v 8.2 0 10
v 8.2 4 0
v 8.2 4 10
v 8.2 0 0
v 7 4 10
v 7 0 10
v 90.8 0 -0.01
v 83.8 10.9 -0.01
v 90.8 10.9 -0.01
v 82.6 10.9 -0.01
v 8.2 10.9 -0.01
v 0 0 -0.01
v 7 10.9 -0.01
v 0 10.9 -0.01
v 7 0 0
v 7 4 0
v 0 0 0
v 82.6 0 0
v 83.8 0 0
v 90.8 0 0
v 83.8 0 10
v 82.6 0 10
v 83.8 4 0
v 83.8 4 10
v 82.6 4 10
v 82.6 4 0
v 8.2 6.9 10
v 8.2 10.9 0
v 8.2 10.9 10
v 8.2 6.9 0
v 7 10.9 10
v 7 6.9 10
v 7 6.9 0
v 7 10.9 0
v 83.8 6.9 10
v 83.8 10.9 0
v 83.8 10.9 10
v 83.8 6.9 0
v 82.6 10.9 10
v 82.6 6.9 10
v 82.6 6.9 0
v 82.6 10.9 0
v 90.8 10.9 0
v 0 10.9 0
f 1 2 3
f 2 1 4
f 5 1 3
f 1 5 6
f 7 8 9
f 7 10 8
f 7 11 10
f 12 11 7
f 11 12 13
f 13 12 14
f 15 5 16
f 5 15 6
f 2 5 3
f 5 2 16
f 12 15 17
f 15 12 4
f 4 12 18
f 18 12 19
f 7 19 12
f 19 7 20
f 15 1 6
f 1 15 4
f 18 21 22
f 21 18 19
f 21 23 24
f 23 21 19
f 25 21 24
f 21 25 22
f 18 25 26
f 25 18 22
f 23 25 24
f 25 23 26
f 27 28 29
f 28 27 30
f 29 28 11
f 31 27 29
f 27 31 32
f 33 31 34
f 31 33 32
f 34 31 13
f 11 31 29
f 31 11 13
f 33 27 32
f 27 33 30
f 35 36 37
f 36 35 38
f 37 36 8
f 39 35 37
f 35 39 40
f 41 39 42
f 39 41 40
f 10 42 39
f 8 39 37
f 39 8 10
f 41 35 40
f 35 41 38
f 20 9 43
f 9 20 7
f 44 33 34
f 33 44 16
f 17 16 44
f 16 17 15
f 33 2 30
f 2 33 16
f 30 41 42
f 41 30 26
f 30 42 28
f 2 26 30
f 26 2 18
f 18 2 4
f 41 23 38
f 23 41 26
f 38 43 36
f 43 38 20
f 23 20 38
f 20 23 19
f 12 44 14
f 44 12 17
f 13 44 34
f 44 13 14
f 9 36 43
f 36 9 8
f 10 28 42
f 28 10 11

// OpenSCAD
// file: ../Base/Boxes.scad
// Fischertechnik Box Foundation
// Pre-designed Boxes

use <Constants.scad>

include <PlacementOptions.scad>

box190Width = 190;
box190Depth = 130;
box130Width = 130;
box130Depth = 95;

// Values are from an original ec3 box
topBottomDifference = 1.5;
outerHeight = 40;
innerHeight = 38.2;
baseThickness = outerHeight - innerHeight;
stackExcess = 5.7;
radius = 3.5;
wallThickness = 1.5;
tolerance = 0.2;
stackOffset = innerHeight - stackExcess;

boxUsageHeight = stackOffset;
boxWallThickness = wallThickness;
boxBaseThickness = baseThickness;
boxWebWidth = 3.0;

// getBoxWallThickness()
// Gets the wall thickness of a Fischertechnik Box
function getBoxWallThickness() = boxWallThickness;

// getBoxUsageHeight()
// Gets the usable height of a Fischertechnik box
function getBoxUsageHeight() = boxUsageHeight;

// getBoxInnerHeight()
// Gets the inner height of a Fischertechnik box, including the stack excess
function getBoxInnerHeight() = innerHeight;

// getBoxBaseThickness()
// Gets the thickness of the Fischertechnik box base.
function getBoxBaseThickness() = boxBaseThickness;

// getBoxWebWidth()
// Gets the width of a box web
function getBoxWebWidth() = boxWebWidth;

// getBox190Space()
// Gets the usable inner space of a Box 190 as an x/y-list
function getBox190Space() = [
    box190Width - 2*getBoxWallThickness() - topBottomDifference, 
    box190Depth - 2*getBoxWallThickness() - topBottomDifference ];

// BoxBase(width, depth)
// Creates an empty stackable Fischertechnik compatible box
// width = Outer width of the box (190, 130, ...)
// depth = Outer depth of the box (130, 95, ...)

module BoxBase(width, depth, height=outerHeight) {    
    thinPlate = 0.01;

    innerHeight = height - baseThickness;    
    
    module BodyPlate(width, depth) {
        translate([radius, radius])
        hull() {
            w = width-2*radius;
            d = depth-2*radius;
            cube([w, d, thinPlate]);
            cylinder(thinPlate, r=radius, $fn=getFragments());
            translate([w, 0])
                cylinder(thinPlate, r=radius, $fn=getFragments());
            translate([w, d])
                cylinder(thinPlate, r=radius, $fn=getFragments());
            translate([0, d])
                cylinder(thinPlate, r=radius, $fn=getFragments());
        }
    }
    
    module Body(tolerance=tolerance) {
        hull() {
            // Bottom with tolerance to fit into the original boxes when stacked
            translate([-wallThickness+tolerance, -wallThickness+tolerance, -baseThickness])
                BodyPlate(width-topBottomDifference-2*tolerance, depth-topBottomDifference-2*tolerance);
            
            // Top
            translate([-wallThickness-topBottomDifference/2, -wallThickness-topBottomDifference/2, innerHeight-thinPlate])
                BodyPlate(width, depth);
         }
    }

    module Cutoff() {
        hull() {
            coWidth = width - 2*wallThickness;
            coDepth = depth - 2*wallThickness;
            
            // Bottom
            BodyPlate(coWidth-topBottomDifference, coDepth-topBottomDifference);

            // Top
            translate([-topBottomDifference/2, -topBottomDifference/2, innerHeight+thinPlate]) 
                BodyPlate(coWidth, coDepth);
        }
    }
    
    difference() {        
        Body();
        Cutoff();
        stackOffset = innerHeight - stackExcess;
        translate([0, 0, stackOffset + baseThickness])
            Body(tolerance=0);
    }
}

// Creates the Fischertechnik empty box 130x190 mm and places it at position 0,0
// 190x130 are the outer sizes, the inner space is slightly smaller. Use getBox190Space() to get the inner sizes.
// The box is positioned that the usable inner space is at the 0,0,0 position. The

module Box190() {
    BoxBase(box190Width, box190Depth);
}

// Gets the usable inner space of a Box 130 as an x/y-list
function getBox130Space() = [
    box130Width - 2*getBoxWallThickness(), 
    box130Depth - 2*getBoxWallThickness() ];

// Creates the Fischertechnik empty box 95x130 mm and places it at position 0,0
// 190x130 are the outer sizes, the inner space is slightly smaller. Use getBox190Space() to get the inner sizes.
// The box is positioned that the usable inner space is at the 0,0,0 position. The

module Box130() {
    BoxBase(box130Width, box130Depth);
}

// Creates a web at the specified box walls
// corner 0 = LowerLeft, 1 = UpperLeft, 2 = UpperRight, 3 = LowerRight
// side 0 = LeftOfCorner, 1 = RightOfCorner
// distance = Distance in mm from the corner
// boxSpace = inner width and depth of the box (default: Box 190)
// webWidth = length of the web (default is 3 mms)
// webThickness = thickness of the web (default is 1 mm)

module BoxWeb(corner, side, distance, boxSpace=getBox190Space(), webWidth=getBoxWebWidth(), webThickness=1.0) {
    sink = getBoxWallThickness()/2;

    width = (corner % 2 == 0) ? 
            (side == LeftOfCorner ? webWidth : webThickness) :
            (side == LeftOfCorner ? webThickness : webWidth);

    depth = (corner % 2 == 0) ? 
            (side == RightOfCorner ? webWidth : webThickness) :
            (side == RightOfCorner ? webThickness : webWidth);
    
    xDiff = corner == LowerLeft ? 
                (side == LeftOfCorner ? -sink : distance) :
            (corner == UpperLeft ?                
                (side == LeftOfCorner ? distance : -sink) :
            (corner == UpperRight ?
                (side == LeftOfCorner ? boxSpace.x-webWidth+sink : boxSpace.x-distance-webThickness) :
                (side == LeftOfCorner ? boxSpace.x-distance-webThickness: boxSpace.x-webWidth+sink)));

    yDiff = corner == LowerLeft ? 
                (side == RightOfCorner ? -sink : distance) :
            (corner == UpperLeft ?
                (side == RightOfCorner ? boxSpace.y-distance : boxSpace.y-webWidth+sink) :
            (corner == UpperRight ?
                (side == RightOfCorner ? boxSpace.y-webWidth+sink : boxSpace.y-distance) :
                (side == RightOfCorner ? distance : -sink)));
    
    translate([xDiff, yDiff, -getExcess()])
        cube([width, depth, boxUsageHeight + 2*getExcess()]);
}
// file: ../Base/Rotation.scad
// Fischertechnik Box Foundation
// Geometry Helpers Rotation

include <PlacementOptions.scad>

// getRotatedSpace(space, rotation=NoRotation)
// Rotates the space dependent on the specified rotation

function getRotatedSpace(space, rotation=NoRotation) = [
    (rotation == Rotate90 || rotation == Rotate270) ? space.y : space.x,
    (rotation == Rotate90 || rotation == Rotate270) ? space.x : space.y
];

// Rotates the given space around the fixed left lower corner
// space = the space the children needs as width/depth list [width,depth]
// rotation = 0 Rotate0 degrees, 1 Rotate90 degrees, 2 Rotate180 degrees, 3 Rotate270 degrees (equivalent to -90)

module RotateFix(space, rotation=NoRotation) {
    dy = (rotation == Rotate0 || rotation == Rotate270) ? 0 :
        (rotation == Rotate90) ? space.x :
        space.y;
    dx = (rotation < Rotate180) ? 0 :
        (rotation == Rotate180) ? space.x :
        space.y;
    
    translate([dx, dy, 0])
        rotate([0, 0, rotations[rotation]])
            children();
}
// file: ../Base/Alignment.scad
// Fischertechnik Box Foundation
// Geometry Helpers Alignment

include <PlacementOptions.scad>

// getAlignedX(elementWidth, spaceWidth, align=AlignRight, offset=0)
// Gets the aligned X offset of an element with the given
// width in the given space.
// elementWidth = The width of the element to positon
// spaceWidth = The space where the element should be aligned
// align = 0 AlignLeft, 1 AlignCenter, 2 AlignRight
// offset = an optional offset from the aligned position. When
// aligned left or centered, then positive values are in X direction.
// When aligned right then positive values are in negative X direction.

function getAlignedX(elementWidth, spaceWidth, align=AlignRight, offset=0) =
    (align == AlignLeft) ?
        offset :
        ((align == AlignCenter) ?
        (spaceWidth - elementWidth)/2 + offset :
        spaceWidth - offset - elementWidth);

// getAlignedY(elementDepth, spaceDepth, align=AlignTop, offset=0)
// Gets the aligned Y offset of an element with the given
// depth in the given space.
// elementDepth = The depth of the element to positon
// spaceDepth = The space where the element should be aligned
// align = 0 AlignBottom, 1 AlignCenter, 2 AlignTop
// offset = an optional offset from the aligned position. When
// aligned bottom or centered, then positive values are in Y direction.
// When aligned top then positive values are in negative Y direction.

function getAlignedY(elementDepth, spaceDepth, align=AlignTop, offset=0) =
    (align == AlignBottom) ?
        offset :
        ((align == AlignCenter) ?
        (spaceDepth - elementDepth)/2 + offset :
        spaceDepth - offset - elementDepth);
// file: ../Base/PlacementOptions.scad
// Fischertechnik Box Foundation
// Placement Options

// Alignment
NoAlign = 0;
AlignLeft = 1;
AlignBottom = 2;
AlignCenter = 3;
AlignRight = 4;
AlignTop = 5;

// Element rotation degree steps
rotations = [0, -90, -180, -270];

// Rotation
NoRotation = 0;
Rotate0 = 0;
Rotate90 = 1;
Rotate180 = 2;
Rotate270 = 3;

// Docking (seen from above)
NoDock = -1;
DockLeft = 0;
DockTop = 1;
DockRight = 2;
DockCorner = 2;
DockBottom = 3;

// Web corners
LowerLeft = 0;
UpperLeft = 1;
UpperRight = 2;
LowerRight = 3;

// Web position relative to corner
LeftOfCorner = 0;
RightOfCorner = 1;
// file: ../Base/Placement.scad
// Fischertechnik Box Foundation
// Geometry Helpers Placement

use <Constants.scad>
use <Alignment.scad>
use <Rotation.scad>
use <Boxes.scad>

include <PlacementOptions.scad>

// Place(x=0, y=0, elementSpace=[0,0], alignX=AlignLeft, alignY=AlignBottom, rotation=Rotate0, boxSpace=getBox190Space())
// Places the child at the specified position
// y = Y-Position. This is a relative position when an X aligment is specified.
// x = X-Position. This is a relative position when an Y aligment is specified.
// elementSpace = space of the element to be placed [x,y]
// alignX = -1=NoAlign, 0 AlignLeft, 1 AlignCenter, 3 AlignRight (elementSpace and boxSpace required!)
// alignY = -1=NoAlign, 2 AlignBottom, 1 AlignCenter, 4 AlignTop (elementSpace and boxSpace required!)
// rotation = 0 Rotate0 0 degrees, 1 Rotate90 90 degrees, 
// 2 Rotate180 180 degrees, 3 Rotate270 270 degrees (equivalent to -90)
// boxSpace = Inner space of the box where the placement occurs [x,y] - default is Box 190x130 inner space

module Place(x=0, y=0, elementSpace=[0,0], 
  alignX=AlignLeft, alignY=AlignBottom, 
  rotation=NoRotation, boxSpace=getBox190Space()) {

    module Position(x, y, space, rotation=Rotate0) {
        translate([x, y, 0])
            RotateFix(space, rotation)
                children();
    }

    space = getRotatedSpace(elementSpace, rotation);
    alignedX = getAlignedX(space.x, boxSpace.x, alignX, x);
    alignedY = getAlignedY(space.y, boxSpace.y, alignY, y);
    Position(alignedX, alignedY, elementSpace, rotation)
        children();
}

// Center(space=getBox130Space(), elementSpace=[0,0])
// space = Space where the children is centered. For cylinder use centered=true and no elementSpace.
// elementSpace = space of the element to be centered [x,y]

module Center(space=getBox190Space(), elementSpace=[0,0]) {
    Place(elementSpace=elementSpace, boxSpace=space, alignX=AlignCenter, alignY=AlignCenter)
        children();
}

// CenterHorizontal(width=0, y=0, offset=0, space=getBox130Space())
// width = Width of the element to be placed.
// y = Y position of the element
// offset = Offset from the center position (negative will be left of the center)
// space = Space where the element is placed

module CenterHorizontal(width=0, y=0, offset=0, space=getBox190Space()) {
    Place(x=offset, y=y, elementSpace=[width, 0], boxSpace=space, alignX=AlignCenter)
        children(0);
}

// CenterVertical(depth=0, x=0, offset=0, space=getBox130Space())
// depth = Depth of the element to be placed.
// x = X position of the element
// offset = Offset from the center position (negative will be down of the center)
// space = Space where the element is placed

module CenterVertical(depth=0, x=0, offset=0, space=getBox190Space()) {
    Place(x=x, y=offset, elementSpace=[0, depth], boxSpace=space, alignY=AlignCenter)
        children(0);
}

// getIsVertical(align)
// True if the specified alignment needs a vertical orientation for a divider (AlignRight, AlignLeft)

function getIsVertical(align) = (align == AlignRight || align == AlignLeft);

// getIsHorizontal(align)
// True if the specified alignment needs a horizontal orientation for a divider (AlignTop, AlignBottom)

function getIsHorizontal(align) = (align == AlignTop || align == AlignBottom);
// file: ../Base/Constants.scad
// Fischertechnik Box Foundation
// Constants

// Constant values necessary for multiple elements

// Base constants
dividerThickness = 1.2;
excess = 0.01;
fragments = 90;
tolerance = 0.8;

// Gets the thickness of a divider 
function getDividerThickness() = dividerThickness;

// Gets the excess that is used to merge walls into each other
function getExcess() = excess;

// Gets amount of fragments of a cylinder
function getFragments() = fragments;

// Gets the inner tolerance of a frame to each side
function getTolerance() = tolerance;


// Fischertechnik specific constants
axisDiameter = 4;
axisBottomDiameter = axisDiameter + 1;
standardEdgeDistance = 2.5;
standardWebDistance = 11.5;
standardCornerLength = 15;
tubeWallFactor = 0.8;
smallPartsFrameHeight = 20;

// Gets axis diameter
function getAxisDiameter() = axisDiameter;

// Gets axis bottom diameter for thicker part at the bottom
function getAxisBottomDiameter() = axisBottomDiameter;

// gets the standard distance to the wall of the box for dockable frames with webs
function getStandardEdgeDistance() = standardEdgeDistance;

// gets the standard distance of each web to the corner of the dockable frame
function getStandardWebDistance() = standardWebDistance;

// gets the standard length of the corner walls of a dockable frame
function getStandardCornerLength() = standardCornerLength;

// gets the wall thickness of a tube.
function getTubeWallThickness() = tubeWallFactor * getDividerThickness();

// gets the frame height for docked small parts boxes.
function getSmallPartsFrameHeight() = smallPartsFrameHeight;
// main file
// Fischertechnik Box Library
// Holder for Building Plate 30x90
// 38251

use <../ModelBase/Complex.scad>

width = 90;

// getHolderBuildingPlateSpace30x90(count = 1)
// Gets the width (.x) and depth (.y) space the holder needs.

function getHolderBuildingPlate30x90Space(count = 1) = getHolderBuildingPlateSpace(width, count);

// HolderBuildingPlate30x90(count=1, dock=false)
// Holder for building plates 30x90
// count = Count of building plates (default 1)
// dock = true if the holders are docked to the box wall (default false) 

module HolderBuildingPlate30x90(count = 1, dock = false) {
    HolderBuildingPlate(width, count, dock);
}

// Test
color("lightgray")
HolderBuildingPlate30x90();
